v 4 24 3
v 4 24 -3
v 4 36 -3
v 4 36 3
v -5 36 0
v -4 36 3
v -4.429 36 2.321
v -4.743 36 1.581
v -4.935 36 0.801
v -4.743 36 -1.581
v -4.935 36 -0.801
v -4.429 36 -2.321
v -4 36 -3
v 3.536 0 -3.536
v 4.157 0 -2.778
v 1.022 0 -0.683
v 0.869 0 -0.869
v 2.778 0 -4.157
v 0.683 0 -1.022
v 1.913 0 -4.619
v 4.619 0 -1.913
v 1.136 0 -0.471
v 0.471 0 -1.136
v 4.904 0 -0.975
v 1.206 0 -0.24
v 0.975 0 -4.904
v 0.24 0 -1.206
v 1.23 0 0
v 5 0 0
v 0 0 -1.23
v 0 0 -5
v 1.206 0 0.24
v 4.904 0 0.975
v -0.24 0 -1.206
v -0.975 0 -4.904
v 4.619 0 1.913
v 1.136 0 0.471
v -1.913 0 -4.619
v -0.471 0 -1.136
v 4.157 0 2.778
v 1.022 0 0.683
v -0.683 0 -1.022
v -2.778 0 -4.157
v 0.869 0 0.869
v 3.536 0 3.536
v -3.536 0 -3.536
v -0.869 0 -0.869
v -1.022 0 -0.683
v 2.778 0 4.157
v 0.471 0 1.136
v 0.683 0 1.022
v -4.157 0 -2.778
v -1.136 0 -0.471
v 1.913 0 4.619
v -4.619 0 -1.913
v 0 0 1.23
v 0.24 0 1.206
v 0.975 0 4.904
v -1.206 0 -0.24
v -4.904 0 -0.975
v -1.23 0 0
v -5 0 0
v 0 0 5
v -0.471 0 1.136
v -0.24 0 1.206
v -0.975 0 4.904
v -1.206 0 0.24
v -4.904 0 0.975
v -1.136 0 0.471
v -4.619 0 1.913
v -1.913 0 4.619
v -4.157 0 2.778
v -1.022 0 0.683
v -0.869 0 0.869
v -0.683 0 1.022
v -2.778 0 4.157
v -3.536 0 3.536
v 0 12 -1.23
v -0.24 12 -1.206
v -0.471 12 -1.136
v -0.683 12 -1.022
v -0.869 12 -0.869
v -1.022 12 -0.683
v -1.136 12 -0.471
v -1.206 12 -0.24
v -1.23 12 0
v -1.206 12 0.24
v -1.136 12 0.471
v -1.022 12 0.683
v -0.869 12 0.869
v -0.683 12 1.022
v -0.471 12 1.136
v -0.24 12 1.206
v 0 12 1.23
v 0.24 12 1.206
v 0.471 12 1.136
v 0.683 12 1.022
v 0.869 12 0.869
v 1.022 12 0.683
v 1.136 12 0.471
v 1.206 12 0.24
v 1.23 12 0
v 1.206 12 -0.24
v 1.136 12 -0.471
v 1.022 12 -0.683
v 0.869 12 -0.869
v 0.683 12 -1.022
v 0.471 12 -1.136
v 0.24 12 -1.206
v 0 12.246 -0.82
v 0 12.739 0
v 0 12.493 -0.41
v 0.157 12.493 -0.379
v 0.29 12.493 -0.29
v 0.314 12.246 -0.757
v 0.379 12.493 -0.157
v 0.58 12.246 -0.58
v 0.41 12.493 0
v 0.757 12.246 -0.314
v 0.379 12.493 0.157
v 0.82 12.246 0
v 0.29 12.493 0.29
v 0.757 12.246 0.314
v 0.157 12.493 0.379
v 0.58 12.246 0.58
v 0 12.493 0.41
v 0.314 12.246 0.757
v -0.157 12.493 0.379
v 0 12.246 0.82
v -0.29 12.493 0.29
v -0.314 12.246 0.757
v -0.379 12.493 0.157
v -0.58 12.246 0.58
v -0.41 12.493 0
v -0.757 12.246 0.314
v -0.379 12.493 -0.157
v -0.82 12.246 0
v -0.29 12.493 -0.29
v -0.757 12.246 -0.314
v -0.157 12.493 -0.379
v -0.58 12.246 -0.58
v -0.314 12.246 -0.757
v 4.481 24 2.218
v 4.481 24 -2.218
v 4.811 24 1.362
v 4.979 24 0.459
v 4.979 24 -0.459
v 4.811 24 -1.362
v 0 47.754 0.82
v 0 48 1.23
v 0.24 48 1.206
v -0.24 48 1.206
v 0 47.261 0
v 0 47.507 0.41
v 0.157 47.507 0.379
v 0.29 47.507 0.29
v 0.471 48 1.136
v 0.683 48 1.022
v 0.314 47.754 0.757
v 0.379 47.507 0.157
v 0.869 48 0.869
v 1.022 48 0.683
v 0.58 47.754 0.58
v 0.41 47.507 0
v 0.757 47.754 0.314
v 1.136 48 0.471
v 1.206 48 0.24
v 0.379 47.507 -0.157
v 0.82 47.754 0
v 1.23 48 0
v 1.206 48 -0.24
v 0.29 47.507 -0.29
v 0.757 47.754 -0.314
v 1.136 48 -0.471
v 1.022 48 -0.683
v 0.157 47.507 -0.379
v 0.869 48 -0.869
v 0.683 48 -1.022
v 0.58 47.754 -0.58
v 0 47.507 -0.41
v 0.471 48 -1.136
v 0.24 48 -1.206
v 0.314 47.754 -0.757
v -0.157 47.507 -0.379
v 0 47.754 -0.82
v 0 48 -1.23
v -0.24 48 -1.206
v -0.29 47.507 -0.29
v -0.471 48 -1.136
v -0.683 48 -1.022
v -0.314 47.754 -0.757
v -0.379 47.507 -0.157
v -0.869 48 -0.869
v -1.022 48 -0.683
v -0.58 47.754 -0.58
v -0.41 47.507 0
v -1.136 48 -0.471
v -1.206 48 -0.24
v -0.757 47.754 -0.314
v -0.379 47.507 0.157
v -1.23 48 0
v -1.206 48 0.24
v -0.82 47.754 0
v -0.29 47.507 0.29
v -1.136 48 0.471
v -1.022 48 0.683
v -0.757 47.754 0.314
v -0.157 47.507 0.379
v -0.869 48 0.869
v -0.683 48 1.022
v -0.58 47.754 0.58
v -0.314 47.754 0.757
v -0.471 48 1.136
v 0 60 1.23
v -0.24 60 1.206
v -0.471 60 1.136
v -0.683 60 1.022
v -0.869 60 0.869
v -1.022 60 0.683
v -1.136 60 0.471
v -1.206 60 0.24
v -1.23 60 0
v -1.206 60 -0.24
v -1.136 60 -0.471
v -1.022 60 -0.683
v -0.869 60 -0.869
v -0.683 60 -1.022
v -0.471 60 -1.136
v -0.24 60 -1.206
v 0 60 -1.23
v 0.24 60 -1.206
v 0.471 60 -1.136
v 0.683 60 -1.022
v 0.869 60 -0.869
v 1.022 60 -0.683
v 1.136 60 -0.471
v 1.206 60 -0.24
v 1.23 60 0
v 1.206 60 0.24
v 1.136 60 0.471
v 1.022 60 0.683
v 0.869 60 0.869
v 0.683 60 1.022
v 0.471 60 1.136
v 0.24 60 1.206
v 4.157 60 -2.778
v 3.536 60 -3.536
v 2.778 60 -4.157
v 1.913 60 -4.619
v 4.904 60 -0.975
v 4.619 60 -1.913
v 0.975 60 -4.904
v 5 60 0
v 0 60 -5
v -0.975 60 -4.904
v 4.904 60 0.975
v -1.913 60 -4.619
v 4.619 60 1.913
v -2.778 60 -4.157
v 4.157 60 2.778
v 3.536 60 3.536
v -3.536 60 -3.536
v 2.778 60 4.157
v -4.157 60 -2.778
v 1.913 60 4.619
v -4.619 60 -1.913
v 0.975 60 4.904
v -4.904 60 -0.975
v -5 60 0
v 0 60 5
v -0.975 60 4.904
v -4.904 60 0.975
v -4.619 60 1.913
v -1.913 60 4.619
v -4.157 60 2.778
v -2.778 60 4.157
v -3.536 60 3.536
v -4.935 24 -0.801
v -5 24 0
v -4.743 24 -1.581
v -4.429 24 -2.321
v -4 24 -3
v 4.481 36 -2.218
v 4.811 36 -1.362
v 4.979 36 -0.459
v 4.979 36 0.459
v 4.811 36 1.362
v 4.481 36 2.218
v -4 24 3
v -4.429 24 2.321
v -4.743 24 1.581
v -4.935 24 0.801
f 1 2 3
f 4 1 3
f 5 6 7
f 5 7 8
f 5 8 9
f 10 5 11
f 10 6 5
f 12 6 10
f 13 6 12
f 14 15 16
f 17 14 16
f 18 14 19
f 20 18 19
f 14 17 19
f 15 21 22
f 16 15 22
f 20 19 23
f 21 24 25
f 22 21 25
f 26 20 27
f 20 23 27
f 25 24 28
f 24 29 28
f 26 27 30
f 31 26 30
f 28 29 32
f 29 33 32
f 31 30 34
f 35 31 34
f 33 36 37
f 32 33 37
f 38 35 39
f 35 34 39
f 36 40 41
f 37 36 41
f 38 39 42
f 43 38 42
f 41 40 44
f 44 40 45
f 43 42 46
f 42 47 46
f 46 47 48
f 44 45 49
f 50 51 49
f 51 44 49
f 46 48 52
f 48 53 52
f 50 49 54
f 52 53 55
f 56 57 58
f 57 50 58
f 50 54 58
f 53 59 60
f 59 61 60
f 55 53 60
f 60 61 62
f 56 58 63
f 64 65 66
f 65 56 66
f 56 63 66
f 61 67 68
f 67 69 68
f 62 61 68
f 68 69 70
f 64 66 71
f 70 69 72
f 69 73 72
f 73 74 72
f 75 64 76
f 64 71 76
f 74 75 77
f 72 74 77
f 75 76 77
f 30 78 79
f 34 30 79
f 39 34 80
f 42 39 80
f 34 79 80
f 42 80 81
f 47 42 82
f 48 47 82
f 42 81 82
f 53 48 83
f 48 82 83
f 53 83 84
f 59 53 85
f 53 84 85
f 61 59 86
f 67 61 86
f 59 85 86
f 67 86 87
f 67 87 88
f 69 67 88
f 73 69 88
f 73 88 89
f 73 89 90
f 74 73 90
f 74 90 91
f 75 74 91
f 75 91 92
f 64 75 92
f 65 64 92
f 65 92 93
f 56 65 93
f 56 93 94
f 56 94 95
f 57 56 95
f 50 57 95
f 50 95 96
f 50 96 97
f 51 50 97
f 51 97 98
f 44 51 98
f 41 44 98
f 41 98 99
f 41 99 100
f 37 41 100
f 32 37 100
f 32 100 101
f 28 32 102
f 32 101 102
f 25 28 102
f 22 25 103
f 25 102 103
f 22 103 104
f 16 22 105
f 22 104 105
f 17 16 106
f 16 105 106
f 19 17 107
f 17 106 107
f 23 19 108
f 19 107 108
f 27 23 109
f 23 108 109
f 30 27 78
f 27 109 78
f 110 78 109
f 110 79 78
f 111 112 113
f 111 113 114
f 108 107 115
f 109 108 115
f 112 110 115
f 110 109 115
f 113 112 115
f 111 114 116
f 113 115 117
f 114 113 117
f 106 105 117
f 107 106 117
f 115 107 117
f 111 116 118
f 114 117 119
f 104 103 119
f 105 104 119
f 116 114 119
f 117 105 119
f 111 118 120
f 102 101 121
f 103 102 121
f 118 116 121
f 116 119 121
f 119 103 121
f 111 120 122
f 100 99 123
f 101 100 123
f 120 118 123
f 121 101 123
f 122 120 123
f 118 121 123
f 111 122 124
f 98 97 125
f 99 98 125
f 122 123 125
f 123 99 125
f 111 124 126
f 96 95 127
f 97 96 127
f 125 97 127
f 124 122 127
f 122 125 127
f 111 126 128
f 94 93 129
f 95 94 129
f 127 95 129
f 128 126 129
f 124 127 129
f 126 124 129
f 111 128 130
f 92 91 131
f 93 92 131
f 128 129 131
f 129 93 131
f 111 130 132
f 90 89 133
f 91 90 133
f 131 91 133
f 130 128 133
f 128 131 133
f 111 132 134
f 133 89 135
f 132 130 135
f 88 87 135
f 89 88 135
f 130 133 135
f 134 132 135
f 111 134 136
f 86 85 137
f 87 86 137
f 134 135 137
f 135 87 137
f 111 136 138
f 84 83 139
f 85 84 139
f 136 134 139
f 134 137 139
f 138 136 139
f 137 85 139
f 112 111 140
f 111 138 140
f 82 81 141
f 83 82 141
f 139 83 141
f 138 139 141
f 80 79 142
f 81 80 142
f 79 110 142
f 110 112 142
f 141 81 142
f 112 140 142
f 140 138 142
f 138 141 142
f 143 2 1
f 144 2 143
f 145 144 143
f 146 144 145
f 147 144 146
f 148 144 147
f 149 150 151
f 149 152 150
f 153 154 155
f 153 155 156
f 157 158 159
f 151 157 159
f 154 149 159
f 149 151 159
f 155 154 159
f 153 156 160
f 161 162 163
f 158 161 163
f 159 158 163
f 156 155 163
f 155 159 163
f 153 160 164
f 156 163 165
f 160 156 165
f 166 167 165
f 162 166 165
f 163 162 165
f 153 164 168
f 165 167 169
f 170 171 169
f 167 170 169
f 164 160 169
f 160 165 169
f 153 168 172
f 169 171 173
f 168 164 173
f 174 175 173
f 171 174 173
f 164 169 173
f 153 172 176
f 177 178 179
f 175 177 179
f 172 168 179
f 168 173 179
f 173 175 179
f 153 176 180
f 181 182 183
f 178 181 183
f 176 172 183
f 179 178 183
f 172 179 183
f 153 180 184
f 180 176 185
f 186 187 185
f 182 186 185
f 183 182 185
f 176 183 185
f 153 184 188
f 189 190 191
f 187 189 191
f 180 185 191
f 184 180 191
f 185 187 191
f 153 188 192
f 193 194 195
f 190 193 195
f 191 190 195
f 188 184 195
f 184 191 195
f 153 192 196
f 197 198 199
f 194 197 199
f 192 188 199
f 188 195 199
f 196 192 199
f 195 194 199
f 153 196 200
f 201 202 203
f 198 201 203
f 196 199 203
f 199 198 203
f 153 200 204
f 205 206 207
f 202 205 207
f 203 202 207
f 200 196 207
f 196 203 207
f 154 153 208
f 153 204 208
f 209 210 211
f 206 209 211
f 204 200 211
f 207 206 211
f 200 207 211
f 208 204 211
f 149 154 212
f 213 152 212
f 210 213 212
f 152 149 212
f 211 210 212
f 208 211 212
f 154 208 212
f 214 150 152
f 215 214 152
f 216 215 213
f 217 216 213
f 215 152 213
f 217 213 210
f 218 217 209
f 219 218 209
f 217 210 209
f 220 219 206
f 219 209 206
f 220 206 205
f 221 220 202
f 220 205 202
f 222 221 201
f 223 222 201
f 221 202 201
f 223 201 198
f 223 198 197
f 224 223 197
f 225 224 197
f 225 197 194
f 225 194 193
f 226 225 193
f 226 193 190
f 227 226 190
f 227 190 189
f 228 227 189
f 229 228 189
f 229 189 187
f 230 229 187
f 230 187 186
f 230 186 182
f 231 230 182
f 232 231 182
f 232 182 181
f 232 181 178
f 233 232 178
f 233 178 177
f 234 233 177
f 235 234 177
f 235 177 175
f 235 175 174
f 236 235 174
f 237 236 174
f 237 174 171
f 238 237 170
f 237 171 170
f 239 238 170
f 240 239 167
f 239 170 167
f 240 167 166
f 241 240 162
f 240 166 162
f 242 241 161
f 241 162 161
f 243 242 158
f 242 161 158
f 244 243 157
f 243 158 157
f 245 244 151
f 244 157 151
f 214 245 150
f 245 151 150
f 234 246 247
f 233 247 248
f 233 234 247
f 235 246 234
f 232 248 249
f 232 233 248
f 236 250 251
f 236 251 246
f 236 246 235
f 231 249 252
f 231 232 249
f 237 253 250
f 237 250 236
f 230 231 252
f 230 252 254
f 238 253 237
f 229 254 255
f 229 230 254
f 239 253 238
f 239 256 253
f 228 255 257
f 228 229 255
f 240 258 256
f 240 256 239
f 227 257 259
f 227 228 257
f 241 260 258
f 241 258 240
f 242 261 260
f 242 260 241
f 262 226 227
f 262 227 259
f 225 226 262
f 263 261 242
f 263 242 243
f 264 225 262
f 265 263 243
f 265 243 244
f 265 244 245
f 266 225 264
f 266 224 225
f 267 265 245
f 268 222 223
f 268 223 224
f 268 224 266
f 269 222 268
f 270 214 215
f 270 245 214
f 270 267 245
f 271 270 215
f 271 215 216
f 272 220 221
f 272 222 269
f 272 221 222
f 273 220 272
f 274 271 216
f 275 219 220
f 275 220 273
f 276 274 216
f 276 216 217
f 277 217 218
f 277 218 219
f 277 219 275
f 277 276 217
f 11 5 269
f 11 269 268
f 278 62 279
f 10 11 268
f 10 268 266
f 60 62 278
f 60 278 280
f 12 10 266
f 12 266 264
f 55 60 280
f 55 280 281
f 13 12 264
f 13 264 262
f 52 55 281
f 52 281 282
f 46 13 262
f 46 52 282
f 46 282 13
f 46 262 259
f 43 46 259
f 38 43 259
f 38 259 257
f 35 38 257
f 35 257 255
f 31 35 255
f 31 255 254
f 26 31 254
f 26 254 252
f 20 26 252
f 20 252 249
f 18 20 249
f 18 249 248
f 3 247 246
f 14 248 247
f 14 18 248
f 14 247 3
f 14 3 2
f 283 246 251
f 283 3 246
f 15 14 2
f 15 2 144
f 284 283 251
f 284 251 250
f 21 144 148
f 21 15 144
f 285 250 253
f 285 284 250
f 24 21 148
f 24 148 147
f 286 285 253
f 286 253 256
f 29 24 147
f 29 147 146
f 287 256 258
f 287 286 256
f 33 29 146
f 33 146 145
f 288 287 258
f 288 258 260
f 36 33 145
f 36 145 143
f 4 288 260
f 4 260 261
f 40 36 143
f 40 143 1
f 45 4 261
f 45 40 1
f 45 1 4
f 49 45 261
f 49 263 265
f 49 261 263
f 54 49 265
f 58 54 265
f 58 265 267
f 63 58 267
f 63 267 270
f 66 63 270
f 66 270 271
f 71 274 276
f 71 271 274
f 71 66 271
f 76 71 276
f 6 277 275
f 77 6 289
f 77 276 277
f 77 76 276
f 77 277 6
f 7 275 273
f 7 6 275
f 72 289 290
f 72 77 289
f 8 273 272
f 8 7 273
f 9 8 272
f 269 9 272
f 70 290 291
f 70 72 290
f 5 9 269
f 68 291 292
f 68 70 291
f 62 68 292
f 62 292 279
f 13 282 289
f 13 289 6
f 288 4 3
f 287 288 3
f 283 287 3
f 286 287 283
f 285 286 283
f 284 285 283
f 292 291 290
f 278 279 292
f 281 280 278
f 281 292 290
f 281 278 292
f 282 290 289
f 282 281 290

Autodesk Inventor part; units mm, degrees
ref_plane "YZ Plane" through (0, 0, 0) normal (1, 0, 0) x (0, 1, 0)
ref_plane "XZ Plane" through (0, 0, 0) normal (0, 1, 0) x (-1, 0, 0)
ref_plane "XY Plane" through (0, 0, 0) normal (0, 0, 1) x (1, 0, 0)
sketch "Sketch1" plane through (0, 0, 0) normal (0, 1, 0) x (-1, 0, 0)
  circle A0 centre (0, 0) radius 5
  dimension "d0" = 10
extrude "Extrusion1" add sketch "Sketch1" along normal blind 60
sketch "Sketch2" plane through (0, 60, 0) normal (0, 1, 0) x (1, 0, 0)
  point P0 (0, 0)
  point P1 (0, 0)
hole "Hole1" at (0, 60, 0) direction (0, -1, 0) diameter 2.459 depth 12 tip angle 118 thread size "M3x0.5" class "6H" standard "ANSI Metric M Profile"
sketch "Sketch3" plane through (0, 0, 0) normal (0, -1, 0) x (1, 0, 0)
  circle A0 centre (0, 0) radius 1.2295 projected
hole "Hole2" at (0, 0, 0) direction (0, 1, 0) diameter 2.459 depth 12 tip angle 118 thread size "M3x0.5" class "6H" standard "ANSI Metric M Profile"
sketch "Sketch4" plane through (0, 0, 0) normal (0, 0, 1) x (1, 0, 0)
  line L0 (-5, 0) -> (-5, 60) projected
  line L1 (5, 0) -> (5, 60) projected
  line L2 (-5, 0) -> (5, 0) projected
  line L3 (5, 60) -> (-5, 60) projected
  line L4 (-5, 24) -> (-4, 24)
  line L5 (-4, 24) -> (-4, 36)
  line L6 (-4, 36) -> (-5, 36)
  line L7 (5, 24) -> (4, 24)
  line L8 (4, 24) -> (4, 36)
  line L9 (4, 36) -> (5, 36)
  line L10 (-5, 36) -> (-15, 36)
  line L11 (-15, 36) -> (-15, 24)
  line L12 (-15, 24) -> (-5, 24)
  line L13 (5, 36) -> (15, 36)
  line L14 (15, 36) -> (15, 24)
  line L15 (15, 24) -> (5, 24)
  point P0 (0, 0)
  point P1 (-4.5, 24)
  dimension "d17" = 60
  dimension "d18" = 12
  dimension "d19" = 24
  dimension "d20" = 1
  dimension "d21" = 1
  dimension "d22" = 10
  dimension "d23" = 10
extrude "Extrusion2" cut sketch "Sketch4" along normal mid plane 10 contours L12 L11 L10 L0 | L0 L6 L5 L4 | L7 L8 L9 L1 | L1 L13 L14 L15
equation "\"d19\" = -0.5 * d18 + 0.5 * d17"
equation "\"d21\" = d20"
equation "\"d23\" = d22"
properties part number "Post-2023-1" material "Copper"
